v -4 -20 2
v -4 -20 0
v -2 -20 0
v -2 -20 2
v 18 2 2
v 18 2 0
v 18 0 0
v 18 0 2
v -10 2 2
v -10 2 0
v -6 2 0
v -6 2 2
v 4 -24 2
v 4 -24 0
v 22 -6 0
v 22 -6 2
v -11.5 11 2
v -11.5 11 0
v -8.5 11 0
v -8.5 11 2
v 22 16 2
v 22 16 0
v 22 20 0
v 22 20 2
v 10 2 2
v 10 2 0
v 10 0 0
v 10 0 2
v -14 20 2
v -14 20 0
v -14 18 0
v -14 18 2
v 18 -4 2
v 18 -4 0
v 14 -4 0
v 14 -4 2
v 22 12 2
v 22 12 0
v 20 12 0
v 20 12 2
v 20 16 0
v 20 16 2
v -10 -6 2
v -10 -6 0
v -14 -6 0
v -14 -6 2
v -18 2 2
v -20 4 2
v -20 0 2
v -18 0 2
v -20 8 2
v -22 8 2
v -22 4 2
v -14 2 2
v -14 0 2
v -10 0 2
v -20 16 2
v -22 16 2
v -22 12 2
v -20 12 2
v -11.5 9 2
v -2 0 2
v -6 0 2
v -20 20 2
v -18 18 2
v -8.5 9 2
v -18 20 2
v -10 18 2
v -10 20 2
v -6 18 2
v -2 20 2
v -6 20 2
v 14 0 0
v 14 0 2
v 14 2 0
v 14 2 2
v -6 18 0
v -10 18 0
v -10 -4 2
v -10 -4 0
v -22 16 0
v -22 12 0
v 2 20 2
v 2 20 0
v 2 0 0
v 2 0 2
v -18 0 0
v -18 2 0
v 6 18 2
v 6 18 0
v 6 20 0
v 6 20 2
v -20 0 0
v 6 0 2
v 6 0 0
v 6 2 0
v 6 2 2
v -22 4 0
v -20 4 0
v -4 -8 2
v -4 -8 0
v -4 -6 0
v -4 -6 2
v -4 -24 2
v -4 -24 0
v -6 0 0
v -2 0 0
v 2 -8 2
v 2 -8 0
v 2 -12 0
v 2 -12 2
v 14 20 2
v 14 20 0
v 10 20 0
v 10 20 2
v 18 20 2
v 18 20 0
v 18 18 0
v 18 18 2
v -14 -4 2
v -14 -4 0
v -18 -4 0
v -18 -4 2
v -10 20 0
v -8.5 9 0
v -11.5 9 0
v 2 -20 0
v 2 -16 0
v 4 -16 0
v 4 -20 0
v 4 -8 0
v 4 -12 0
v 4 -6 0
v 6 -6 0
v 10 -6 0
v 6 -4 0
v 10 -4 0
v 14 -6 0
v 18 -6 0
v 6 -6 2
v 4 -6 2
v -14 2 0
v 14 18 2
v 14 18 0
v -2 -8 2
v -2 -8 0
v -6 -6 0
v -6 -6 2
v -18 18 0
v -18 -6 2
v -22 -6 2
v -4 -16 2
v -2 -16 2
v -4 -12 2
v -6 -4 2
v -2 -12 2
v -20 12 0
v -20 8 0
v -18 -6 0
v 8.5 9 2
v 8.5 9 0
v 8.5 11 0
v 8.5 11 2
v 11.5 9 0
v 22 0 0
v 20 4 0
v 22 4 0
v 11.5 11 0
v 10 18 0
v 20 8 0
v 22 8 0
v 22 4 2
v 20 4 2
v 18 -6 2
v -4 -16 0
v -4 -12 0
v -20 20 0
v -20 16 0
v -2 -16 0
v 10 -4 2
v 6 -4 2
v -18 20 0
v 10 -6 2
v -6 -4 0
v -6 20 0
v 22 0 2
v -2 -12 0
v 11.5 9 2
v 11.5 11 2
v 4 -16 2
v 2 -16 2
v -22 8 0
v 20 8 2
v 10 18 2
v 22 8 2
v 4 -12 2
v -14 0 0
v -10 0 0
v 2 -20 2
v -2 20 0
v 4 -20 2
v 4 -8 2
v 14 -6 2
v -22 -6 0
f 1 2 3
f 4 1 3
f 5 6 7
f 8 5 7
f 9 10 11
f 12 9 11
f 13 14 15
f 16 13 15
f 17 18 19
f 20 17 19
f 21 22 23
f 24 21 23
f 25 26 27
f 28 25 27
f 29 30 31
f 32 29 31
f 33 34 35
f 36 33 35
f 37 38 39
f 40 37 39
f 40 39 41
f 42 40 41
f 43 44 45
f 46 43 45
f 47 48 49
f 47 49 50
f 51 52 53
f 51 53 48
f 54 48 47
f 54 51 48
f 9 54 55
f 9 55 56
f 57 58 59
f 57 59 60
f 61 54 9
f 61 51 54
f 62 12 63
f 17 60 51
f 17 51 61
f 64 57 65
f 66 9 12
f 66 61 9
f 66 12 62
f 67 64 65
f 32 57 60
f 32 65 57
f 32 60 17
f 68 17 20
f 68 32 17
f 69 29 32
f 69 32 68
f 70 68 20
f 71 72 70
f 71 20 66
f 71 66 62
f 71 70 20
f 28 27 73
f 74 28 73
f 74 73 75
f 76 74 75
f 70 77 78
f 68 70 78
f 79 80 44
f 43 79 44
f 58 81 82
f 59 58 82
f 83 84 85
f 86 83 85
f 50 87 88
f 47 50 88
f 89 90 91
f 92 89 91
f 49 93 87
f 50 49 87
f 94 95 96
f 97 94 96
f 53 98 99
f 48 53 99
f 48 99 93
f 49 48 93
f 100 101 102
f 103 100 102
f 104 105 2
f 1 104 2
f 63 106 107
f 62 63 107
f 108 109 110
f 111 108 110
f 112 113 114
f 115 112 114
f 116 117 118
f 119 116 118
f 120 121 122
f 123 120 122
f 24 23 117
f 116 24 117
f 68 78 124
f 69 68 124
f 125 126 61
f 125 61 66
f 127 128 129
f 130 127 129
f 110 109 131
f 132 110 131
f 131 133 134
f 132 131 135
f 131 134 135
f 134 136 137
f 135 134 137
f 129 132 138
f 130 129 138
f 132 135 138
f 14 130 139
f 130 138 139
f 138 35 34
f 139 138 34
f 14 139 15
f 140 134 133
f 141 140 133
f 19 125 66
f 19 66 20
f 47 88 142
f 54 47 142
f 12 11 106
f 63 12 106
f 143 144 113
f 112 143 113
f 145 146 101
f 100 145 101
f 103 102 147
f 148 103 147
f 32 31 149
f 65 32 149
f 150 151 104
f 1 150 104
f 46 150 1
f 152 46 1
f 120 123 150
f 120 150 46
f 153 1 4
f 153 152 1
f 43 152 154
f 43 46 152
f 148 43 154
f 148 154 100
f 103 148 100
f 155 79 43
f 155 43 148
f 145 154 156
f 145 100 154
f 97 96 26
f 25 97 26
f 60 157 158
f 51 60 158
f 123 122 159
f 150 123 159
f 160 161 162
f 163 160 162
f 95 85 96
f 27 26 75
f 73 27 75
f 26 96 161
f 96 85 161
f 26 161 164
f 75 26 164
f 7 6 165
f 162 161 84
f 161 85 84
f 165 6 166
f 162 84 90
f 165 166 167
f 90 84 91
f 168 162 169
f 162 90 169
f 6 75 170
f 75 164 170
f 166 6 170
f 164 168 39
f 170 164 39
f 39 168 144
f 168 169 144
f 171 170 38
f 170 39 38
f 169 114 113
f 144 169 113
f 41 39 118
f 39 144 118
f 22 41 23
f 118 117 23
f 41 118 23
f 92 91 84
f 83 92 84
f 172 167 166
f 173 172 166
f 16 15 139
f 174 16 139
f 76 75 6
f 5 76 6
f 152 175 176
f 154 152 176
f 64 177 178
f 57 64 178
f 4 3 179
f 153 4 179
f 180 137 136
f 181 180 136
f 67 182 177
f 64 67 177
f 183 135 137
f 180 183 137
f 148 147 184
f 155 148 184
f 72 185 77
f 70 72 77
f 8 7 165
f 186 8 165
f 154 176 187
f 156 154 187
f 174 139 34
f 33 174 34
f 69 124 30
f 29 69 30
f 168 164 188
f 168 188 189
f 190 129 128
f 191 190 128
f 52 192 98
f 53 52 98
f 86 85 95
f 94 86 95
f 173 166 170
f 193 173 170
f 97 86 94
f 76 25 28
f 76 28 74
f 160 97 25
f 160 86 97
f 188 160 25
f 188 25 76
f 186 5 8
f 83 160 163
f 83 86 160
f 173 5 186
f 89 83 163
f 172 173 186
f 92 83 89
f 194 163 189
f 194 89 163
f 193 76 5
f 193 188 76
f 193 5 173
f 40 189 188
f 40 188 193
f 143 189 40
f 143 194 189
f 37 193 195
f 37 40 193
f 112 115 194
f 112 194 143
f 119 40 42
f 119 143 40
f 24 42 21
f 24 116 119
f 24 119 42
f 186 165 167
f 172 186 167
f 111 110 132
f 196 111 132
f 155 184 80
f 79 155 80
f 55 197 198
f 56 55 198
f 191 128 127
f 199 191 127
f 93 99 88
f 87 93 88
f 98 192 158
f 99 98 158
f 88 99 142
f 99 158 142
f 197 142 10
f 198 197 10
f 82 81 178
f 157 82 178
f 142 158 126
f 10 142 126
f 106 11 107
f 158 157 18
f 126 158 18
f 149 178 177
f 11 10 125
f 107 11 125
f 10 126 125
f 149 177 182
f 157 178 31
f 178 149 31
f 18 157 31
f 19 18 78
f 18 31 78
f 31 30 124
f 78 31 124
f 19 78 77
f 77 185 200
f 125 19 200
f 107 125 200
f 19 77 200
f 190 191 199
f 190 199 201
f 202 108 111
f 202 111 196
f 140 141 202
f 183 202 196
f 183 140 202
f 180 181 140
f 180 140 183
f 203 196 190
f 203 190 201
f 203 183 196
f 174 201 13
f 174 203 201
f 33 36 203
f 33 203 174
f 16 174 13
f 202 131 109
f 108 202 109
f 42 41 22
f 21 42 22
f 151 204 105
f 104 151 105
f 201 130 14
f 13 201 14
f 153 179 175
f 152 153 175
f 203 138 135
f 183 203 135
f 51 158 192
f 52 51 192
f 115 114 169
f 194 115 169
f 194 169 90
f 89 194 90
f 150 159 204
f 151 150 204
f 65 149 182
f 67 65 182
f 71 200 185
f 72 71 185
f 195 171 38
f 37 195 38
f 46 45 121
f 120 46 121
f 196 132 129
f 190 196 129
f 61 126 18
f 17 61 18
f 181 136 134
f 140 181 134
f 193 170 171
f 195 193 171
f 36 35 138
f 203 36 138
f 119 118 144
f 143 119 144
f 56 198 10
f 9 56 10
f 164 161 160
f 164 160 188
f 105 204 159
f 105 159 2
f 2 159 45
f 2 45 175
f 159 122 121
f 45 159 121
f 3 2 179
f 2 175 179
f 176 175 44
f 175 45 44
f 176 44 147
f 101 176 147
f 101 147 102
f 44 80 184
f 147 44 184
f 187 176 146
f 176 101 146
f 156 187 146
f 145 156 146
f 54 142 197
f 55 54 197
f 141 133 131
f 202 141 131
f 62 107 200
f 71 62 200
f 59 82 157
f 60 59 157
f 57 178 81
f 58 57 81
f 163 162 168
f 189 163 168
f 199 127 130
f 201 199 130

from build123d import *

# Parameters (mm, degrees)
F0_DEPTH = 2
F1_W     = 3
F1_H     = 2
F4_DEPTH = 2
F2_DEPTH = 25


with BuildPart() as f0:
    # F3 (on Top) → F0 (new body)
    with BuildSketch(Plane.XY):
        Polygon((-6, 0), (-2, 0), (-2, 20), (-6, 20), (-6, 18), (-10, 18), (-10, 20), (-14, 20), (-14, 18), (-18, 18), (-18, 20), (-20, 20), (-20, 16), (-22, 16), (-22, 12), (-20, 12), (-20, 8), (-22, 8), (-22, 4), (-20, 4), (-20, 0), (-18, 0), (-18, 2), (-14, 2), (-14, 0), (-10, 0), (-10, 2), (-6, 2), align=None)
        Polygon((2, 20), (2, 0), (6, 0), (6, 2), (10, 2), (10, 0), (14, 0), (14, 2), (18, 2), (18, 0), (22, 0), (22, 4), (20, 4), (20, 8), (22, 8), (22, 12), (20, 12), (20, 16), (22, 16), (22, 20), (18, 20), (18, 18), (14, 18), (14, 20), (10, 20), (10, 18), (6, 18), (6, 20), align=None)
        Polygon((-4, -8), (-4, -6), (-6, -6), (-6, -4), (-10, -4), (-10, -6), (-14, -6), (-14, -4), (-18, -4), (-18, -6), (-22, -6), (-4, -24), (-4, -20), (-2, -20), (-2, -16), (-4, -16), (-4, -12), (-2, -12), (-2, -8), align=None)
        Polygon((6, -6), (4, -6), (4, -8), (2, -8), (2, -12), (4, -12), (4, -16), (2, -16), (2, -20), (4, -20), (4, -24), (22, -6), (18, -6), (18, -4), (14, -4), (14, -6), (10, -6), (10, -4), (6, -4), align=None)
    extrude(amount=F0_DEPTH)

    # F1 (on Top) → F4 (cut)
    with BuildSketch(Plane.XY):
        with Locations((10, 10)):
            Rectangle(F1_W, F1_H)
    extrude(amount=F4_DEPTH, mode=Mode.SUBTRACT)

    # F1 (on Top) → F2 (cut)
    with BuildSketch(Plane.XY):
        with Locations((-10, 10)):
            Rectangle(F1_W, F1_H)
    extrude(amount=F2_DEPTH, mode=Mode.SUBTRACT)


solid = f0.part
